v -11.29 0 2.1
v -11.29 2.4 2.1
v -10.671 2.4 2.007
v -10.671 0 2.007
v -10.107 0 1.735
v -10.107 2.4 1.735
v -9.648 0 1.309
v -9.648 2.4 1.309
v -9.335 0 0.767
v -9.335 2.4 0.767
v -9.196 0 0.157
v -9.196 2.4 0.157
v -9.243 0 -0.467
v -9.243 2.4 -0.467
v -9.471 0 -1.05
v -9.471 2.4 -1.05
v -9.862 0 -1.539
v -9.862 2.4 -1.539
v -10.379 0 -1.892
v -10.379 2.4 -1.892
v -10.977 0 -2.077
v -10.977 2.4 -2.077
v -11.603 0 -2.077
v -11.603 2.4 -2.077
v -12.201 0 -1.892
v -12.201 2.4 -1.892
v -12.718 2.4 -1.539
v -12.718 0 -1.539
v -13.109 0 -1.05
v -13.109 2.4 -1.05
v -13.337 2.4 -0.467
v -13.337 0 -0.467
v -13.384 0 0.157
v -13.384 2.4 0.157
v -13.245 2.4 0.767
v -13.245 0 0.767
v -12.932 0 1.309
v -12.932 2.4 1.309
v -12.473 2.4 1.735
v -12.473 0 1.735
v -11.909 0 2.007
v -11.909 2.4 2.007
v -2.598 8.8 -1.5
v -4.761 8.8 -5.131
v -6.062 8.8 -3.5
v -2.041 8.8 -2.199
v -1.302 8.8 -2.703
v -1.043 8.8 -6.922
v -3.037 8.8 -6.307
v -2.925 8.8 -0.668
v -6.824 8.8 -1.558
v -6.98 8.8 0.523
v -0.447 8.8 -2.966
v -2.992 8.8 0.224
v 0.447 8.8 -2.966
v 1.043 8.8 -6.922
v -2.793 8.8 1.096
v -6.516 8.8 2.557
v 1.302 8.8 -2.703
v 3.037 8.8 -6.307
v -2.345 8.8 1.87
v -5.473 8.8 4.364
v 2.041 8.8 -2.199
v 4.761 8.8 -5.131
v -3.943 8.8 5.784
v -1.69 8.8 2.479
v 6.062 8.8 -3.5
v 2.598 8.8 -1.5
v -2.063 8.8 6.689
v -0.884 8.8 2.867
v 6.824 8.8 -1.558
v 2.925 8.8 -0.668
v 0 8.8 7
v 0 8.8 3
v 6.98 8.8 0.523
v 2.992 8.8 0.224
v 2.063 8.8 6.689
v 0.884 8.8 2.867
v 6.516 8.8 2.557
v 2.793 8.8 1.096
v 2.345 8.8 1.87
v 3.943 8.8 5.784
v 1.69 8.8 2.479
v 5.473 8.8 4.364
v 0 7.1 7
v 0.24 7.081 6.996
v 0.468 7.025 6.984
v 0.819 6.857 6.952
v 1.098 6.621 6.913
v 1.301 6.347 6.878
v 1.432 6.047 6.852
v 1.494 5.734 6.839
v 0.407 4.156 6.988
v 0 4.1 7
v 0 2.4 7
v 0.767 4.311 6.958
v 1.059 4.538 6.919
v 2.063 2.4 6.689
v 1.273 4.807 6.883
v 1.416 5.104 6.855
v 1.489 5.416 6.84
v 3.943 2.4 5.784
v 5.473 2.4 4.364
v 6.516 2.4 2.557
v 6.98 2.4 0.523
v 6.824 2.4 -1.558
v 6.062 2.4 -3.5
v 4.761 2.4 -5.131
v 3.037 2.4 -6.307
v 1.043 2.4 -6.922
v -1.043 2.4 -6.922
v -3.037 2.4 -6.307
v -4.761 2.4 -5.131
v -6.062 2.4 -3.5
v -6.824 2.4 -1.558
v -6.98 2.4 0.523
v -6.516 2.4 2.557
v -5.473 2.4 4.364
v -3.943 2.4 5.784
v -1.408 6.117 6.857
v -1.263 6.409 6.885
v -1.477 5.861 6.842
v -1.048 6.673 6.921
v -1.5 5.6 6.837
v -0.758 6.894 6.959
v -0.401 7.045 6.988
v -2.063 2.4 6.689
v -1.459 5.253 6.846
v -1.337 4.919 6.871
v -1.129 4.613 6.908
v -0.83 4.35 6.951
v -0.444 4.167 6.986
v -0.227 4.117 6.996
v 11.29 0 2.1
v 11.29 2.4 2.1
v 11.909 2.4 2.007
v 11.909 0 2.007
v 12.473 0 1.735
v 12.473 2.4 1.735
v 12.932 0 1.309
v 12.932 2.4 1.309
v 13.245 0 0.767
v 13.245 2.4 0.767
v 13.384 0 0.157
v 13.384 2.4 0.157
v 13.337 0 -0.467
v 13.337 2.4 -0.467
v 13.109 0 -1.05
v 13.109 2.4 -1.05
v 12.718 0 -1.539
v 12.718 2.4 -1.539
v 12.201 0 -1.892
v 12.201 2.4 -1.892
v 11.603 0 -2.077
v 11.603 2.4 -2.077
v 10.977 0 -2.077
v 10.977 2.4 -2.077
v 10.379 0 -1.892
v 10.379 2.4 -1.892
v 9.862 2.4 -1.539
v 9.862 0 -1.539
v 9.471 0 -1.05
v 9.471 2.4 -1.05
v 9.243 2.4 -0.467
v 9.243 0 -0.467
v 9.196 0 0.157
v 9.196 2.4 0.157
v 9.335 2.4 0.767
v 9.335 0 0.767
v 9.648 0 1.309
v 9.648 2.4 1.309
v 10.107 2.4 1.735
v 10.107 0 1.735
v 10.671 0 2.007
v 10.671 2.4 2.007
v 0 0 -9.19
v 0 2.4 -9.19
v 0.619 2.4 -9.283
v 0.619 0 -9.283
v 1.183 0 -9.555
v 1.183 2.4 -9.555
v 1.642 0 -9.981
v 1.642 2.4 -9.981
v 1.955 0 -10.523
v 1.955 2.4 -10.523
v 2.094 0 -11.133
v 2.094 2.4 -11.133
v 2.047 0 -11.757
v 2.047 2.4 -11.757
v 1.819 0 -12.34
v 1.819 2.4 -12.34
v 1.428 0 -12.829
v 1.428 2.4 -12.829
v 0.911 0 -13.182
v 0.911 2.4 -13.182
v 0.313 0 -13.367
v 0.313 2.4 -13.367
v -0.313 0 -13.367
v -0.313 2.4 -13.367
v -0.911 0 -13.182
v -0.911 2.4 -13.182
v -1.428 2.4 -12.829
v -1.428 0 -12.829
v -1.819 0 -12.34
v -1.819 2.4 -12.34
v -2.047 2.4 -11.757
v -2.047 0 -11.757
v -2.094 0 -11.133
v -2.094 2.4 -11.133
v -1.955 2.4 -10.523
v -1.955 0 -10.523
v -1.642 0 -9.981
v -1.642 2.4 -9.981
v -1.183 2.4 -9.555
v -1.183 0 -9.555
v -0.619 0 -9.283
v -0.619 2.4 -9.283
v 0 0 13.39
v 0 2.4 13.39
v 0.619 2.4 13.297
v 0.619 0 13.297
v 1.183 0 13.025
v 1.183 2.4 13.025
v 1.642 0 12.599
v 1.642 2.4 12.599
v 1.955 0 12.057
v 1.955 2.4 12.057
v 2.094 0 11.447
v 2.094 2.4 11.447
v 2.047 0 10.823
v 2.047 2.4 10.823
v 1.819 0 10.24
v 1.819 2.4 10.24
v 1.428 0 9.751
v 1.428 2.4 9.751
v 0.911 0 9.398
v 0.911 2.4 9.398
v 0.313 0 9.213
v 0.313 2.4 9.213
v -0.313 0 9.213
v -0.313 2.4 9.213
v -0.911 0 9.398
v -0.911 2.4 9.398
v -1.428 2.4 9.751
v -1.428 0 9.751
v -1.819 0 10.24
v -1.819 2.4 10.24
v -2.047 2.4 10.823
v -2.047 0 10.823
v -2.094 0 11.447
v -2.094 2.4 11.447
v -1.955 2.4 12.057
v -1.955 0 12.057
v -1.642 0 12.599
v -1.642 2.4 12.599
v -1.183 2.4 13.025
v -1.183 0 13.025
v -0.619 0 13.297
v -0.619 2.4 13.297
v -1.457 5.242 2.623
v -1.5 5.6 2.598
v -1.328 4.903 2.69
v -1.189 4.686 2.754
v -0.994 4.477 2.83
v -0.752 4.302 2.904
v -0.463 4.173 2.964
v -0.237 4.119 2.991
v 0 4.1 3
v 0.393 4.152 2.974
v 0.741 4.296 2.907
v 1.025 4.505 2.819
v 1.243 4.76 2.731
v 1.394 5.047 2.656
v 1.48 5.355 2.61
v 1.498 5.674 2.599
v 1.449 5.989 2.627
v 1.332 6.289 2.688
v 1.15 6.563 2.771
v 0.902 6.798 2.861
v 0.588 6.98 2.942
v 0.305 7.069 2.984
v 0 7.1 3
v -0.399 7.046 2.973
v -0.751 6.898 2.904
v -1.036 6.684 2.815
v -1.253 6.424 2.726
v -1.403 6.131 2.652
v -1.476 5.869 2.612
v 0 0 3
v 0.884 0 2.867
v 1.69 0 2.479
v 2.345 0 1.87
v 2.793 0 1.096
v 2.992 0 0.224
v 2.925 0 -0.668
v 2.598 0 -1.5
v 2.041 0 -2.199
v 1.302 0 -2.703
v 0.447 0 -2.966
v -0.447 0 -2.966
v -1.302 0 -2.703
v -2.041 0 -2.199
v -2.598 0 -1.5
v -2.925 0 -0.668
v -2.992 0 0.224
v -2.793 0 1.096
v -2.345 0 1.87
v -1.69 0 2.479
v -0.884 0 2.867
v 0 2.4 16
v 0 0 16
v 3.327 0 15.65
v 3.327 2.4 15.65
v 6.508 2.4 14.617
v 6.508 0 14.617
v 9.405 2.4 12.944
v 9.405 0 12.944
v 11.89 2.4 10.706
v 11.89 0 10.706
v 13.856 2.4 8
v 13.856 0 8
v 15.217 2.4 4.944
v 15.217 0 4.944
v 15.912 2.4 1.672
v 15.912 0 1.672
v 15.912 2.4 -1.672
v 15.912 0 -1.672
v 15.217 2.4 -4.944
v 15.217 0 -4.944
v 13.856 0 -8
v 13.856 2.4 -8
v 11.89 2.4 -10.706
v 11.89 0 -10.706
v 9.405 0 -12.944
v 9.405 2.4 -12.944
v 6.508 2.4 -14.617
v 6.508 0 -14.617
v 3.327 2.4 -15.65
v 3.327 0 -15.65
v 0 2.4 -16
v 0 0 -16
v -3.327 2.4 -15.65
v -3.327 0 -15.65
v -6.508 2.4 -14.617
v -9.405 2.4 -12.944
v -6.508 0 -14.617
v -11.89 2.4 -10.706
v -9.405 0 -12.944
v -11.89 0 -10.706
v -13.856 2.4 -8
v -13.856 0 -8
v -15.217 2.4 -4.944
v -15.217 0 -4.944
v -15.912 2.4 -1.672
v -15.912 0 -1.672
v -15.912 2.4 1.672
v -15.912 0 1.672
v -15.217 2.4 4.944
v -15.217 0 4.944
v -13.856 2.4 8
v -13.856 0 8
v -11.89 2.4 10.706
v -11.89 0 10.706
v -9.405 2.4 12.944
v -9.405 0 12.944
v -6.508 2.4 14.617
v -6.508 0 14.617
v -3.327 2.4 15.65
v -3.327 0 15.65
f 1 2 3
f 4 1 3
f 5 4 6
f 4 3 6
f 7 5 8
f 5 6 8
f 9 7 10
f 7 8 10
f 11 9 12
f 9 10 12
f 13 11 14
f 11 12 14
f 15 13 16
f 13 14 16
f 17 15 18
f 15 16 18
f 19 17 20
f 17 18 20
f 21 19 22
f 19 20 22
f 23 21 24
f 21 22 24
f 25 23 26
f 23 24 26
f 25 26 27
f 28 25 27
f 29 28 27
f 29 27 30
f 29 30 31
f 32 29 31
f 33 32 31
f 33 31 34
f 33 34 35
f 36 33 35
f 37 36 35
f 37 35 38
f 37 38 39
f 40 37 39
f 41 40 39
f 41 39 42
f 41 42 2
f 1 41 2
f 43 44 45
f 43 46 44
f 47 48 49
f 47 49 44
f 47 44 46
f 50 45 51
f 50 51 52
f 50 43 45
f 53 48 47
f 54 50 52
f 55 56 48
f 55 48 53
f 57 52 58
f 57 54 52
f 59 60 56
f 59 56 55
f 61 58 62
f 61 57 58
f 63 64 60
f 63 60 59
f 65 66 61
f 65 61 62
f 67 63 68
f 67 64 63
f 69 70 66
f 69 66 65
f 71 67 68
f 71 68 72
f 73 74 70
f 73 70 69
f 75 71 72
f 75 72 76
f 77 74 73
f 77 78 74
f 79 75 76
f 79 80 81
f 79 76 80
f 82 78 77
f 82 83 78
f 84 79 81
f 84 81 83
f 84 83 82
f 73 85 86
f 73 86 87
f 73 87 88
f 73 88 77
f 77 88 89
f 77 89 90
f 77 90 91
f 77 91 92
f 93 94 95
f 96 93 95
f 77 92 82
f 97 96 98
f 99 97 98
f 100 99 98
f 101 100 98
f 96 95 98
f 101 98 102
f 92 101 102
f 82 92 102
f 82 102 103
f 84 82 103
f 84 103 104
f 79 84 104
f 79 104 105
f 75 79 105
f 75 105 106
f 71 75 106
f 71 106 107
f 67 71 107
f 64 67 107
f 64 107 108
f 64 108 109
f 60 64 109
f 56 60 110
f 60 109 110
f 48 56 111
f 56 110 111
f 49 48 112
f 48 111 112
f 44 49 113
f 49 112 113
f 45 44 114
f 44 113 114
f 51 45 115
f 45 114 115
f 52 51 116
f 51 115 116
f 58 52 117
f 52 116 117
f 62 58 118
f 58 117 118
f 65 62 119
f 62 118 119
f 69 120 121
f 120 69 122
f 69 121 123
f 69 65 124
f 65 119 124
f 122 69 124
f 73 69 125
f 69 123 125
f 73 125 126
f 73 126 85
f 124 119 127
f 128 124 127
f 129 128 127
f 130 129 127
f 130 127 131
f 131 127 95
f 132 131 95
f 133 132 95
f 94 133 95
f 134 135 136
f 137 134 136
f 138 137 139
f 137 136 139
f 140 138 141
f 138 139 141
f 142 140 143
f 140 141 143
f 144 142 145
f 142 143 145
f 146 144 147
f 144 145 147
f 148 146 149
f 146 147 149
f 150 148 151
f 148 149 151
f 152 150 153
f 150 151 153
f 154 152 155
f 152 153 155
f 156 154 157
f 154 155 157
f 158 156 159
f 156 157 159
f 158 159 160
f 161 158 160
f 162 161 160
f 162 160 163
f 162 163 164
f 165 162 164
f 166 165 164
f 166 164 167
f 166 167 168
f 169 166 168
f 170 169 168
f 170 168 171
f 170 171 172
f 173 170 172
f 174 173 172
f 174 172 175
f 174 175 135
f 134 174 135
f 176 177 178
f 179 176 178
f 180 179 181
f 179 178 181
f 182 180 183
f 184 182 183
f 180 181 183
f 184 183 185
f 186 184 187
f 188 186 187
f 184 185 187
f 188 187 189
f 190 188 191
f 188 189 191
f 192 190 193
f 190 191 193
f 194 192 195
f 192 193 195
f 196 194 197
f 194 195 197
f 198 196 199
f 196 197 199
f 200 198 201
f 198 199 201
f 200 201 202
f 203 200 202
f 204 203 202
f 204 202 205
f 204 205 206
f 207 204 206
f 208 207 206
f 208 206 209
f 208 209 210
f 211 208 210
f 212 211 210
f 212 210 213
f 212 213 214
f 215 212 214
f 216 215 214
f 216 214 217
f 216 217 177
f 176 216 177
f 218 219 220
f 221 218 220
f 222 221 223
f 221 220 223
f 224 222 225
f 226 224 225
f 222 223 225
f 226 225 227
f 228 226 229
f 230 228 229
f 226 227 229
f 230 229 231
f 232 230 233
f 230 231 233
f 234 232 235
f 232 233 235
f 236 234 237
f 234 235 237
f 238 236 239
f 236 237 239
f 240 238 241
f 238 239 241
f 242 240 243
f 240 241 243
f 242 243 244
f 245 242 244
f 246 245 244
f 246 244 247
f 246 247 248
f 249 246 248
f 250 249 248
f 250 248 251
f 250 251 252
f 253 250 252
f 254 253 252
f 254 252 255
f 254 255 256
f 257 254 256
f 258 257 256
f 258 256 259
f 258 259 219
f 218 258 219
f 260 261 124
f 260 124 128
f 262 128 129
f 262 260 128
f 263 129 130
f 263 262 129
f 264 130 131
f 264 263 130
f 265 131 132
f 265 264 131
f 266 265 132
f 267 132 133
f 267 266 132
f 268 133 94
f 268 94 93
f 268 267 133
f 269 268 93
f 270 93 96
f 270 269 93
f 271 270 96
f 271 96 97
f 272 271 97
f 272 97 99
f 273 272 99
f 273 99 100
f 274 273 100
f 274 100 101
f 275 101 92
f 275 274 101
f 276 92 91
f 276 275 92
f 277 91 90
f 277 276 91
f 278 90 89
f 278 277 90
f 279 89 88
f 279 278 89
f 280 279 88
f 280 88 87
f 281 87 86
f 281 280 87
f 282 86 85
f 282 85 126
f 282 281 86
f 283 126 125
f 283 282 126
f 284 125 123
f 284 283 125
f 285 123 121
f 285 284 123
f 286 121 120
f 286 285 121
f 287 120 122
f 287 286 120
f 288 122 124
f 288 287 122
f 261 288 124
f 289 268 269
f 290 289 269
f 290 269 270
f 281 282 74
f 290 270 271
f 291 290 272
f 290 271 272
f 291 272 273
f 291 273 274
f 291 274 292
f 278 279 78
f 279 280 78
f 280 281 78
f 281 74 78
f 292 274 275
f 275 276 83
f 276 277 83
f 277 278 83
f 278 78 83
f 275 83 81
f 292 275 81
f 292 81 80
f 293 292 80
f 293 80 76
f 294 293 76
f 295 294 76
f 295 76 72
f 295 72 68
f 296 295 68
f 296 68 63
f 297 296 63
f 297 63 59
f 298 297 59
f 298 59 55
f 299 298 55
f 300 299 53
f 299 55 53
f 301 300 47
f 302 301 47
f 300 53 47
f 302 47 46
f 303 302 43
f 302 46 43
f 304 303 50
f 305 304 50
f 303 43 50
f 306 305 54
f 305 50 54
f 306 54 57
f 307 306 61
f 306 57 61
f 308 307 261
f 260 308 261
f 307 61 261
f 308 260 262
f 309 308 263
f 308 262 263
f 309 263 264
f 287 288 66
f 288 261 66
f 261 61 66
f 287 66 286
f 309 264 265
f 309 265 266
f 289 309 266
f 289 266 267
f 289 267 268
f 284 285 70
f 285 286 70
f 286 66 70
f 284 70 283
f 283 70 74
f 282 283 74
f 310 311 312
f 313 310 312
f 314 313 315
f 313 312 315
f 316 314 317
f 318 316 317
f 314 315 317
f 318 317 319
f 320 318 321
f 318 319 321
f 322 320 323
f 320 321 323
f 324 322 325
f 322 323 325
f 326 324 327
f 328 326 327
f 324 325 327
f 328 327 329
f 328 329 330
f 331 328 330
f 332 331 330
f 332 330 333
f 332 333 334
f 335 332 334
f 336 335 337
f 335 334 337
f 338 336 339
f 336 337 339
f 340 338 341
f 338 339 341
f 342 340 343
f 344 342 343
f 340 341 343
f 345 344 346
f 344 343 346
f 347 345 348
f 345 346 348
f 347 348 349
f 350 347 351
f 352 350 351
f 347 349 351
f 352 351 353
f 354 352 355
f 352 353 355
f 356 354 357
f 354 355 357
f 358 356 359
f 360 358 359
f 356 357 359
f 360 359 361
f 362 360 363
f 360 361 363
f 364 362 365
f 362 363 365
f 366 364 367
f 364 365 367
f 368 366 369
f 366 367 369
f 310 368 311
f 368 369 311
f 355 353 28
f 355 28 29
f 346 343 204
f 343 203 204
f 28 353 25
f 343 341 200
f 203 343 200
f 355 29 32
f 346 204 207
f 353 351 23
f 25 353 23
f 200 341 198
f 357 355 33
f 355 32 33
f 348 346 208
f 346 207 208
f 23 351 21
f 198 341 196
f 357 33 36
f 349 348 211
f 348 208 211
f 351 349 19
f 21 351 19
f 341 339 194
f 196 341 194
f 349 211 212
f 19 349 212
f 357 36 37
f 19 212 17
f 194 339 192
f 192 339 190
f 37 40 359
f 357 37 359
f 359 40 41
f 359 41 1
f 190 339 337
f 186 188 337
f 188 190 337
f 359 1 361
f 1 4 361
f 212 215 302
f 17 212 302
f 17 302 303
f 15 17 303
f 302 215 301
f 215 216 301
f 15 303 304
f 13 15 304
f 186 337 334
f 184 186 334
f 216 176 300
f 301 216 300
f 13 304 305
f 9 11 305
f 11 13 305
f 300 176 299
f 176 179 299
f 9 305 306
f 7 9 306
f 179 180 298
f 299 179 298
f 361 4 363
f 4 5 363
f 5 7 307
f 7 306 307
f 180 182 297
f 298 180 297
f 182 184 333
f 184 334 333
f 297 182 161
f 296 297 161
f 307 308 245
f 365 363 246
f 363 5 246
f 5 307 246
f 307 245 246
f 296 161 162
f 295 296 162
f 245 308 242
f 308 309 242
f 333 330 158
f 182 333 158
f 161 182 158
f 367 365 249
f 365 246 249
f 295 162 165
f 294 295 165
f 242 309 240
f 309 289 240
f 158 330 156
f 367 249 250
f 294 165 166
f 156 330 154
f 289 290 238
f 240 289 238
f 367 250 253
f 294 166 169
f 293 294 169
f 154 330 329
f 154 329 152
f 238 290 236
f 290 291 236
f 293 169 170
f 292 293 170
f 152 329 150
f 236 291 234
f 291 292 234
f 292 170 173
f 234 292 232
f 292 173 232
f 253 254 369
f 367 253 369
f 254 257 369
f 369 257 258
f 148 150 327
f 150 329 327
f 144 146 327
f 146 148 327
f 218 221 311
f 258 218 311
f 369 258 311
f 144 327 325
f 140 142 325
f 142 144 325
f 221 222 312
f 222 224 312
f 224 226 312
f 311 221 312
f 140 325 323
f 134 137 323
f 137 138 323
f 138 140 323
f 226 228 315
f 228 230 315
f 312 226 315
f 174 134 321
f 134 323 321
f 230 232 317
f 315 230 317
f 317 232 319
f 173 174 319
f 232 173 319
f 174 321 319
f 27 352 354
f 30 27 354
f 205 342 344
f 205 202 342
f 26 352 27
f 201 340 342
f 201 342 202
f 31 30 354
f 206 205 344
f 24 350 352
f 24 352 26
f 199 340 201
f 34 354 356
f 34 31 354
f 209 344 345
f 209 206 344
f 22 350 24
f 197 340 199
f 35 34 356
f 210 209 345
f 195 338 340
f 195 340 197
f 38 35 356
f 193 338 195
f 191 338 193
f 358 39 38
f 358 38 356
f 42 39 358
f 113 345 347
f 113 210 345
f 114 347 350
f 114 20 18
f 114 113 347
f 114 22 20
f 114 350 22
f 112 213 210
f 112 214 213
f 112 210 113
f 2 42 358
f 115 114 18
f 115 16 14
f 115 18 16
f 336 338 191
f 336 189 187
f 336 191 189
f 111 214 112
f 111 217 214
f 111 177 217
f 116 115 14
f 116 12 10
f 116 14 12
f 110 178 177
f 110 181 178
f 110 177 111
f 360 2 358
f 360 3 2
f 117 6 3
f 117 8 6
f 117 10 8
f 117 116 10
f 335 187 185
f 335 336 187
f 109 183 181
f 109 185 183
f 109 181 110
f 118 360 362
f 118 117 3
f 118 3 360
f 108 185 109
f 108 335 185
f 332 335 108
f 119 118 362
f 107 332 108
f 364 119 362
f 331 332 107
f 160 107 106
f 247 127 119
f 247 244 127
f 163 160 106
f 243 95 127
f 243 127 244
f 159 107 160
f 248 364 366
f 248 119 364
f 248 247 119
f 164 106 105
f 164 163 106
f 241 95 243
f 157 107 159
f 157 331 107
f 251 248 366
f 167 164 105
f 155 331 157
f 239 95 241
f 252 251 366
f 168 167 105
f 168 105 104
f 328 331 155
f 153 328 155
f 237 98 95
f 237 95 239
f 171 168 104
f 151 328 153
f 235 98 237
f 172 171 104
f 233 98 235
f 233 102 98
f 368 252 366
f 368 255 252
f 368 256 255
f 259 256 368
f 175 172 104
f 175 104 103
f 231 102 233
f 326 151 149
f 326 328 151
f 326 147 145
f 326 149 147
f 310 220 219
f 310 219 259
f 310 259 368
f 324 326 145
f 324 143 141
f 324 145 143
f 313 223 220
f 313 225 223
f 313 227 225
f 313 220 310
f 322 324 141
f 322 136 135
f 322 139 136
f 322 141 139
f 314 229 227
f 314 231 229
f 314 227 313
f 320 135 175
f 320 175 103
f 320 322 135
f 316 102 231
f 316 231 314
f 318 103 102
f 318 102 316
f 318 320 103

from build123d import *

# Parameters (mm, degrees)
SKETCH_1_R               = 16
EXTRUDE_1_DEPTH          = 2.4
SKETCH_2_R               = 7
EXTRUDE_2_DEPTH          = 6.4
CUT_EXTRUDE_1_REACH      = 26.278
SKETCH_3_R               = 3
CUT_EXTRUDE_2_REACH      = 25.515
SKETCH_4_R               = 2.1
CUT_EXTRUDE_3_REACH      = 26.278
CUT_EXTRUDE_3_END_RADIUS = 7
SKETCH_5_R               = 1.5


with BuildPart() as part:
    # 草圖1 → 填料-伸長1 (new body)
    with BuildSketch(Plane(origin=(0, 0, 0), x_dir=(1, 0, 0), z_dir=(0, 1, 0))):
        with Locations(Location((0, 0, 0), (0, 0, 270))):
            Circle(SKETCH_1_R)
    extrude(amount=EXTRUDE_1_DEPTH)

    # 草圖2 → 填料-伸長2 (add)
    with BuildSketch(Plane(origin=(0, 2.4, 0), x_dir=(1, 0, 0), z_dir=(0, 1, 0))):
        with Locations(Location((0, 0, 0), (0, 0, 270))):
            Circle(SKETCH_2_R)
    extrude(amount=EXTRUDE_2_DEPTH)

    # 草圖3 → 除料-伸長1 (cut, up to next)
    with BuildSketch(Plane(origin=(0, 8.8, 0), x_dir=(1, 0, 0), z_dir=(0, 1, 0)), mode=Mode.PRIVATE) as cut_extrude_1_sk1:
        with Locations(Location((0, 0, 0), (0, 0, 270))):
            Circle(SKETCH_3_R)
    cut_extrude_1_tool1 = extrude(cut_extrude_1_sk1.sketch, amount=-CUT_EXTRUDE_1_REACH, mode=Mode.PRIVATE) & part.part
    add(cut_extrude_1_tool1.solids().sort_by_distance((0, 8.8, 0))[0], mode=Mode.SUBTRACT)

    # 草圖4 → 除料-伸長2 (cut, up to next)
    with BuildSketch(Plane(origin=(0, 2.4, 0), x_dir=(1, 0, 0), z_dir=(0, 1, 0)), mode=Mode.PRIVATE) as cut_extrude_2_sk1:
        with Locations(Location((0, 11.29, 0), (0, 0, 270))):
            Circle(SKETCH_4_R)
    cut_extrude_2_tool1 = extrude(cut_extrude_2_sk1.sketch, amount=-CUT_EXTRUDE_2_REACH, mode=Mode.PRIVATE) & part.part
    # 草圖4 → 除料-伸長2 (cut, up to next)
    with BuildSketch(Plane(origin=(0, 2.4, 0), x_dir=(1, 0, 0), z_dir=(0, 1, 0)), mode=Mode.PRIVATE) as cut_extrude_2_sk2:
        with Locations(Location((11.29, 0, 0), (0, 0, 270))):
            Circle(SKETCH_4_R)
    cut_extrude_2_tool2 = extrude(cut_extrude_2_sk2.sketch, amount=-CUT_EXTRUDE_2_REACH, mode=Mode.PRIVATE) & part.part
    # 草圖4 → 除料-伸長2 (cut, up to next)
    with BuildSketch(Plane(origin=(0, 2.4, 0), x_dir=(1, 0, 0), z_dir=(0, 1, 0)), mode=Mode.PRIVATE) as cut_extrude_2_sk3:
        with Locations(Location((0, -11.29, 0), (0, 0, 270))):
            Circle(SKETCH_4_R)
    cut_extrude_2_tool3 = extrude(cut_extrude_2_sk3.sketch, amount=-CUT_EXTRUDE_2_REACH, mode=Mode.PRIVATE) & part.part
    # 草圖4 → 除料-伸長2 (cut, up to next)
    with BuildSketch(Plane(origin=(0, 2.4, 0), x_dir=(1, 0, 0), z_dir=(0, 1, 0)), mode=Mode.PRIVATE) as cut_extrude_2_sk4:
        with Locations(Location((-11.29, 0, 0), (0, 0, 270))):
            Circle(SKETCH_4_R)
    cut_extrude_2_tool4 = extrude(cut_extrude_2_sk4.sketch, amount=-CUT_EXTRUDE_2_REACH, mode=Mode.PRIVATE) & part.part
    add(cut_extrude_2_tool1.solids().sort_by_distance((0, 2.4, -11.29))[0], mode=Mode.SUBTRACT)
    add(cut_extrude_2_tool2.solids().sort_by_distance((11.29, 2.4, 0))[0], mode=Mode.SUBTRACT)
    add(cut_extrude_2_tool3.solids().sort_by_distance((0, 2.4, 11.29))[0], mode=Mode.SUBTRACT)
    add(cut_extrude_2_tool4.solids().sort_by_distance((-11.29, 2.4, 0))[0], mode=Mode.SUBTRACT)

    # 除料-伸長3: up to this cylinder (the profile starts inside it)
    cut_extrude_3_end = Plane(origin=(0, 5.6, 0), z_dir=(0, -1, 0)) * Cylinder(CUT_EXTRUDE_3_END_RADIUS, 67.556, mode=Mode.PRIVATE)
    # 草圖5 → 除料-伸長3 (cut, up to the surface)
    with BuildSketch(Plane.XY, mode=Mode.PRIVATE) as cut_extrude_3_sk1:
        with Locations(Location((0, 5.6, 0), (0, 0, 180))):
            Circle(SKETCH_5_R)
    cut_extrude_3_tool1 = extrude(cut_extrude_3_sk1.sketch, amount=CUT_EXTRUDE_3_REACH, mode=Mode.PRIVATE) & cut_extrude_3_end
    add(cut_extrude_3_tool1.solids().sort_by_distance((0, 5.6, 0))[0], mode=Mode.SUBTRACT)


solid = part.part
